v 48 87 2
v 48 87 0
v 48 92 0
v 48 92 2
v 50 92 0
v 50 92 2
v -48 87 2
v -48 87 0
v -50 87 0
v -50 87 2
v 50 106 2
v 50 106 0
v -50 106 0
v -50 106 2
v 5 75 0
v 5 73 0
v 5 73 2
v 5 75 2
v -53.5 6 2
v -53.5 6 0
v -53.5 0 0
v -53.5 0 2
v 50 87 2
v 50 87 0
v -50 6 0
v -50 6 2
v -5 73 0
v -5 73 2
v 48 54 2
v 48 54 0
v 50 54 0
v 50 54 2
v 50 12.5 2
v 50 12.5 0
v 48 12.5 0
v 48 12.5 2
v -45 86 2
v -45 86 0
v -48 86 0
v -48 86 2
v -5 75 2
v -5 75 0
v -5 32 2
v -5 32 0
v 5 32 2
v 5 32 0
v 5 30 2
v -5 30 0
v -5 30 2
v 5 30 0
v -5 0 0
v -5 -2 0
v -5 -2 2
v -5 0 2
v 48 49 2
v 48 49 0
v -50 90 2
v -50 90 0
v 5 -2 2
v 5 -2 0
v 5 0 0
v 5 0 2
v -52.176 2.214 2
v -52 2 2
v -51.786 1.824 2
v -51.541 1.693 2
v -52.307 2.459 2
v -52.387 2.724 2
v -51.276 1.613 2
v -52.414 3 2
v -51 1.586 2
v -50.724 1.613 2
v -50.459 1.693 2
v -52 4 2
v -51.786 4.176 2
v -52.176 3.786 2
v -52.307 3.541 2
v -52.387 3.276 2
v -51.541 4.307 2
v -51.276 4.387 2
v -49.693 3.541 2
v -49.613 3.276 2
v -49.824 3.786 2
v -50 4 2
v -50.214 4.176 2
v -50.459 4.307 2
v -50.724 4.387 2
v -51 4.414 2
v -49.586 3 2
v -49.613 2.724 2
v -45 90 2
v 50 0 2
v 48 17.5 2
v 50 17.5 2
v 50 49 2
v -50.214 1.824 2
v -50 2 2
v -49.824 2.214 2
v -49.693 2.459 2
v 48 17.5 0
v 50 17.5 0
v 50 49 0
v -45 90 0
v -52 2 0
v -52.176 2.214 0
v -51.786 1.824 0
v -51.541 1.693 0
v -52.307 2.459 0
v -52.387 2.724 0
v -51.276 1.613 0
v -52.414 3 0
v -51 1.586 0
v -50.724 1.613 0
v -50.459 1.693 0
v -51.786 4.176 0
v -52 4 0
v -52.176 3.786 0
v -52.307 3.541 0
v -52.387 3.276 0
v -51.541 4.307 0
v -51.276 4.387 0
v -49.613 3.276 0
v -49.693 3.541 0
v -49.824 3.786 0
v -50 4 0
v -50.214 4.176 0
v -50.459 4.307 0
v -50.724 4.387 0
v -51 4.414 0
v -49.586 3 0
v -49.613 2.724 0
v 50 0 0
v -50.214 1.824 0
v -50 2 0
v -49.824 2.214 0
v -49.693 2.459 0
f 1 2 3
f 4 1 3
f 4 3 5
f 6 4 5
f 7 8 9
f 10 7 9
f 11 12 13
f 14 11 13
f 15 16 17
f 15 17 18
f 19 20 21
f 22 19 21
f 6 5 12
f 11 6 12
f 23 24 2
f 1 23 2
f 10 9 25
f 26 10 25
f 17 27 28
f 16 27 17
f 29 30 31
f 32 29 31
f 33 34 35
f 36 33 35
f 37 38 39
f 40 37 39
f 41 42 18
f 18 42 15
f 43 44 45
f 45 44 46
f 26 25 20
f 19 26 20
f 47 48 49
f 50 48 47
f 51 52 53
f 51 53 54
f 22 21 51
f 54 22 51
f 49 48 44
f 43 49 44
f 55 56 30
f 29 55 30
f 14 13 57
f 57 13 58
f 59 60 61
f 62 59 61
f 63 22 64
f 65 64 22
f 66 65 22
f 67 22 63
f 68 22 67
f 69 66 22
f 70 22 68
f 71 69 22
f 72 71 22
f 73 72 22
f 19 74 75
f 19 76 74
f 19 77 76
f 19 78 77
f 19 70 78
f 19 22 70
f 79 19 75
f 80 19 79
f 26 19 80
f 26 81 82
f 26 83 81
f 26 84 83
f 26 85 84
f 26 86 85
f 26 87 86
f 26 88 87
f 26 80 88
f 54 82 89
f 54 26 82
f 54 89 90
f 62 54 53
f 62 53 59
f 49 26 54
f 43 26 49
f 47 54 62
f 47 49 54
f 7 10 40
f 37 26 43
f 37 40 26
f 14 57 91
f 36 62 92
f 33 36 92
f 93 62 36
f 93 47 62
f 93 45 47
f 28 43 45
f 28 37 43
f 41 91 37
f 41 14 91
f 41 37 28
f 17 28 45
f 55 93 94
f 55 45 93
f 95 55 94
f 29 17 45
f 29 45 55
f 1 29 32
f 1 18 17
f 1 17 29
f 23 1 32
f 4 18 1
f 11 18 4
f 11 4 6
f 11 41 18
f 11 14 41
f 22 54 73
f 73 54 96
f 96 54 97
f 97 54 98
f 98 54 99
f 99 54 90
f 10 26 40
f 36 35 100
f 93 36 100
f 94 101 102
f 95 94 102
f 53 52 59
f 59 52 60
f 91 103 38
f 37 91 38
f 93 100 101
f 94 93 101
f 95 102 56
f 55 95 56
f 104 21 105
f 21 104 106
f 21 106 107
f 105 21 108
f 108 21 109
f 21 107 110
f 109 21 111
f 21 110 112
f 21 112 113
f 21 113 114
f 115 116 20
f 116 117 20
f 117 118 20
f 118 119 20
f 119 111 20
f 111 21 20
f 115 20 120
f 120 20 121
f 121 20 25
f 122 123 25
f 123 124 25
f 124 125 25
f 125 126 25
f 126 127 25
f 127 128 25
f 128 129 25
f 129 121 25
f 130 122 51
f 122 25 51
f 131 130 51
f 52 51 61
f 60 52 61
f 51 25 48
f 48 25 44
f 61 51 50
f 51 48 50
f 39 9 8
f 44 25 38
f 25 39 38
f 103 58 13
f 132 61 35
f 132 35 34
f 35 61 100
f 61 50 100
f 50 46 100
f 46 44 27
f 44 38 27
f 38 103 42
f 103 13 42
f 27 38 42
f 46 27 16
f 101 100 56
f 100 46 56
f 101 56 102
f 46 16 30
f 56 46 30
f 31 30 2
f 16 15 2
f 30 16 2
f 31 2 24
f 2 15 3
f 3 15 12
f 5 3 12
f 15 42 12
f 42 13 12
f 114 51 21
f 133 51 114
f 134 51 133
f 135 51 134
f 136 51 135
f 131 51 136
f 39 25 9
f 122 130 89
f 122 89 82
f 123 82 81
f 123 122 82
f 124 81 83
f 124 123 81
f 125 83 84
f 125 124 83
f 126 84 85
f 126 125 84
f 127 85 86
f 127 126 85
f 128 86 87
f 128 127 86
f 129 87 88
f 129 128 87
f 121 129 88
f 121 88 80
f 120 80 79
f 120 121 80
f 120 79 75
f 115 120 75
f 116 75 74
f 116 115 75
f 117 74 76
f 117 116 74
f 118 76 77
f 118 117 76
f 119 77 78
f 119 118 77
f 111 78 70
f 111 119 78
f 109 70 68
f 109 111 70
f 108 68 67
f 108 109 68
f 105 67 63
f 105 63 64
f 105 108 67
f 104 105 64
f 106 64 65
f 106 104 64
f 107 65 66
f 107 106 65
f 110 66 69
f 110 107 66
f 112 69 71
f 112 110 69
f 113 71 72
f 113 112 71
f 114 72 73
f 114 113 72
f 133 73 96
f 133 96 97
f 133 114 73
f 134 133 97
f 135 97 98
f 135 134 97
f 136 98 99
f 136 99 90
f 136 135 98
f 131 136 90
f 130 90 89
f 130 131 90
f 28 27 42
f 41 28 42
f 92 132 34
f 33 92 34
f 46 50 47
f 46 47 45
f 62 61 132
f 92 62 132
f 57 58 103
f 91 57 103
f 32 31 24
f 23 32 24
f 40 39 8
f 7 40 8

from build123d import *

# Parameters (mm, degrees)
SKETCH1_R           = 1.414213562
SKETCH1_W           = 10
SKETCH1_H           = 2
BOSS_EXTRUDE1_DEPTH = 2


with BuildPart() as part:
    # Sketch1 → Boss-Extrude1 (new body)
    with BuildSketch(Plane.XY):
        Polygon((-53.5, 0), (-50, 0), (-5, 0), (5, 0), (50, 0), (50, 12.5), (48, 12.5), (48, 17.5), (50, 17.5), (50, 30), (50, 49), (48, 49), (48, 54), (50, 54), (50, 73), (50, 87), (48, 87), (48, 92), (50, 92), (50, 106), (-50, 106), (-50, 90), (-45, 90), (-45, 87), (-45, 86), (-48, 86), (-48, 87), (-50, 87), (-50, 6), (-53.5, 6), align=None)
        with Locations((-51, 3)):
            Circle(SKETCH1_R, mode=Mode.SUBTRACT)
        with Locations((0, 31)):
            Rectangle(SKETCH1_W, SKETCH1_H, mode=Mode.SUBTRACT)
        with Locations((0, 74)):
            Rectangle(SKETCH1_W, SKETCH1_H, mode=Mode.SUBTRACT)
        with Locations((0, -1)):
            Rectangle(SKETCH1_W, SKETCH1_H)
    extrude(amount=BOSS_EXTRUDE1_DEPTH)


solid = part.part
